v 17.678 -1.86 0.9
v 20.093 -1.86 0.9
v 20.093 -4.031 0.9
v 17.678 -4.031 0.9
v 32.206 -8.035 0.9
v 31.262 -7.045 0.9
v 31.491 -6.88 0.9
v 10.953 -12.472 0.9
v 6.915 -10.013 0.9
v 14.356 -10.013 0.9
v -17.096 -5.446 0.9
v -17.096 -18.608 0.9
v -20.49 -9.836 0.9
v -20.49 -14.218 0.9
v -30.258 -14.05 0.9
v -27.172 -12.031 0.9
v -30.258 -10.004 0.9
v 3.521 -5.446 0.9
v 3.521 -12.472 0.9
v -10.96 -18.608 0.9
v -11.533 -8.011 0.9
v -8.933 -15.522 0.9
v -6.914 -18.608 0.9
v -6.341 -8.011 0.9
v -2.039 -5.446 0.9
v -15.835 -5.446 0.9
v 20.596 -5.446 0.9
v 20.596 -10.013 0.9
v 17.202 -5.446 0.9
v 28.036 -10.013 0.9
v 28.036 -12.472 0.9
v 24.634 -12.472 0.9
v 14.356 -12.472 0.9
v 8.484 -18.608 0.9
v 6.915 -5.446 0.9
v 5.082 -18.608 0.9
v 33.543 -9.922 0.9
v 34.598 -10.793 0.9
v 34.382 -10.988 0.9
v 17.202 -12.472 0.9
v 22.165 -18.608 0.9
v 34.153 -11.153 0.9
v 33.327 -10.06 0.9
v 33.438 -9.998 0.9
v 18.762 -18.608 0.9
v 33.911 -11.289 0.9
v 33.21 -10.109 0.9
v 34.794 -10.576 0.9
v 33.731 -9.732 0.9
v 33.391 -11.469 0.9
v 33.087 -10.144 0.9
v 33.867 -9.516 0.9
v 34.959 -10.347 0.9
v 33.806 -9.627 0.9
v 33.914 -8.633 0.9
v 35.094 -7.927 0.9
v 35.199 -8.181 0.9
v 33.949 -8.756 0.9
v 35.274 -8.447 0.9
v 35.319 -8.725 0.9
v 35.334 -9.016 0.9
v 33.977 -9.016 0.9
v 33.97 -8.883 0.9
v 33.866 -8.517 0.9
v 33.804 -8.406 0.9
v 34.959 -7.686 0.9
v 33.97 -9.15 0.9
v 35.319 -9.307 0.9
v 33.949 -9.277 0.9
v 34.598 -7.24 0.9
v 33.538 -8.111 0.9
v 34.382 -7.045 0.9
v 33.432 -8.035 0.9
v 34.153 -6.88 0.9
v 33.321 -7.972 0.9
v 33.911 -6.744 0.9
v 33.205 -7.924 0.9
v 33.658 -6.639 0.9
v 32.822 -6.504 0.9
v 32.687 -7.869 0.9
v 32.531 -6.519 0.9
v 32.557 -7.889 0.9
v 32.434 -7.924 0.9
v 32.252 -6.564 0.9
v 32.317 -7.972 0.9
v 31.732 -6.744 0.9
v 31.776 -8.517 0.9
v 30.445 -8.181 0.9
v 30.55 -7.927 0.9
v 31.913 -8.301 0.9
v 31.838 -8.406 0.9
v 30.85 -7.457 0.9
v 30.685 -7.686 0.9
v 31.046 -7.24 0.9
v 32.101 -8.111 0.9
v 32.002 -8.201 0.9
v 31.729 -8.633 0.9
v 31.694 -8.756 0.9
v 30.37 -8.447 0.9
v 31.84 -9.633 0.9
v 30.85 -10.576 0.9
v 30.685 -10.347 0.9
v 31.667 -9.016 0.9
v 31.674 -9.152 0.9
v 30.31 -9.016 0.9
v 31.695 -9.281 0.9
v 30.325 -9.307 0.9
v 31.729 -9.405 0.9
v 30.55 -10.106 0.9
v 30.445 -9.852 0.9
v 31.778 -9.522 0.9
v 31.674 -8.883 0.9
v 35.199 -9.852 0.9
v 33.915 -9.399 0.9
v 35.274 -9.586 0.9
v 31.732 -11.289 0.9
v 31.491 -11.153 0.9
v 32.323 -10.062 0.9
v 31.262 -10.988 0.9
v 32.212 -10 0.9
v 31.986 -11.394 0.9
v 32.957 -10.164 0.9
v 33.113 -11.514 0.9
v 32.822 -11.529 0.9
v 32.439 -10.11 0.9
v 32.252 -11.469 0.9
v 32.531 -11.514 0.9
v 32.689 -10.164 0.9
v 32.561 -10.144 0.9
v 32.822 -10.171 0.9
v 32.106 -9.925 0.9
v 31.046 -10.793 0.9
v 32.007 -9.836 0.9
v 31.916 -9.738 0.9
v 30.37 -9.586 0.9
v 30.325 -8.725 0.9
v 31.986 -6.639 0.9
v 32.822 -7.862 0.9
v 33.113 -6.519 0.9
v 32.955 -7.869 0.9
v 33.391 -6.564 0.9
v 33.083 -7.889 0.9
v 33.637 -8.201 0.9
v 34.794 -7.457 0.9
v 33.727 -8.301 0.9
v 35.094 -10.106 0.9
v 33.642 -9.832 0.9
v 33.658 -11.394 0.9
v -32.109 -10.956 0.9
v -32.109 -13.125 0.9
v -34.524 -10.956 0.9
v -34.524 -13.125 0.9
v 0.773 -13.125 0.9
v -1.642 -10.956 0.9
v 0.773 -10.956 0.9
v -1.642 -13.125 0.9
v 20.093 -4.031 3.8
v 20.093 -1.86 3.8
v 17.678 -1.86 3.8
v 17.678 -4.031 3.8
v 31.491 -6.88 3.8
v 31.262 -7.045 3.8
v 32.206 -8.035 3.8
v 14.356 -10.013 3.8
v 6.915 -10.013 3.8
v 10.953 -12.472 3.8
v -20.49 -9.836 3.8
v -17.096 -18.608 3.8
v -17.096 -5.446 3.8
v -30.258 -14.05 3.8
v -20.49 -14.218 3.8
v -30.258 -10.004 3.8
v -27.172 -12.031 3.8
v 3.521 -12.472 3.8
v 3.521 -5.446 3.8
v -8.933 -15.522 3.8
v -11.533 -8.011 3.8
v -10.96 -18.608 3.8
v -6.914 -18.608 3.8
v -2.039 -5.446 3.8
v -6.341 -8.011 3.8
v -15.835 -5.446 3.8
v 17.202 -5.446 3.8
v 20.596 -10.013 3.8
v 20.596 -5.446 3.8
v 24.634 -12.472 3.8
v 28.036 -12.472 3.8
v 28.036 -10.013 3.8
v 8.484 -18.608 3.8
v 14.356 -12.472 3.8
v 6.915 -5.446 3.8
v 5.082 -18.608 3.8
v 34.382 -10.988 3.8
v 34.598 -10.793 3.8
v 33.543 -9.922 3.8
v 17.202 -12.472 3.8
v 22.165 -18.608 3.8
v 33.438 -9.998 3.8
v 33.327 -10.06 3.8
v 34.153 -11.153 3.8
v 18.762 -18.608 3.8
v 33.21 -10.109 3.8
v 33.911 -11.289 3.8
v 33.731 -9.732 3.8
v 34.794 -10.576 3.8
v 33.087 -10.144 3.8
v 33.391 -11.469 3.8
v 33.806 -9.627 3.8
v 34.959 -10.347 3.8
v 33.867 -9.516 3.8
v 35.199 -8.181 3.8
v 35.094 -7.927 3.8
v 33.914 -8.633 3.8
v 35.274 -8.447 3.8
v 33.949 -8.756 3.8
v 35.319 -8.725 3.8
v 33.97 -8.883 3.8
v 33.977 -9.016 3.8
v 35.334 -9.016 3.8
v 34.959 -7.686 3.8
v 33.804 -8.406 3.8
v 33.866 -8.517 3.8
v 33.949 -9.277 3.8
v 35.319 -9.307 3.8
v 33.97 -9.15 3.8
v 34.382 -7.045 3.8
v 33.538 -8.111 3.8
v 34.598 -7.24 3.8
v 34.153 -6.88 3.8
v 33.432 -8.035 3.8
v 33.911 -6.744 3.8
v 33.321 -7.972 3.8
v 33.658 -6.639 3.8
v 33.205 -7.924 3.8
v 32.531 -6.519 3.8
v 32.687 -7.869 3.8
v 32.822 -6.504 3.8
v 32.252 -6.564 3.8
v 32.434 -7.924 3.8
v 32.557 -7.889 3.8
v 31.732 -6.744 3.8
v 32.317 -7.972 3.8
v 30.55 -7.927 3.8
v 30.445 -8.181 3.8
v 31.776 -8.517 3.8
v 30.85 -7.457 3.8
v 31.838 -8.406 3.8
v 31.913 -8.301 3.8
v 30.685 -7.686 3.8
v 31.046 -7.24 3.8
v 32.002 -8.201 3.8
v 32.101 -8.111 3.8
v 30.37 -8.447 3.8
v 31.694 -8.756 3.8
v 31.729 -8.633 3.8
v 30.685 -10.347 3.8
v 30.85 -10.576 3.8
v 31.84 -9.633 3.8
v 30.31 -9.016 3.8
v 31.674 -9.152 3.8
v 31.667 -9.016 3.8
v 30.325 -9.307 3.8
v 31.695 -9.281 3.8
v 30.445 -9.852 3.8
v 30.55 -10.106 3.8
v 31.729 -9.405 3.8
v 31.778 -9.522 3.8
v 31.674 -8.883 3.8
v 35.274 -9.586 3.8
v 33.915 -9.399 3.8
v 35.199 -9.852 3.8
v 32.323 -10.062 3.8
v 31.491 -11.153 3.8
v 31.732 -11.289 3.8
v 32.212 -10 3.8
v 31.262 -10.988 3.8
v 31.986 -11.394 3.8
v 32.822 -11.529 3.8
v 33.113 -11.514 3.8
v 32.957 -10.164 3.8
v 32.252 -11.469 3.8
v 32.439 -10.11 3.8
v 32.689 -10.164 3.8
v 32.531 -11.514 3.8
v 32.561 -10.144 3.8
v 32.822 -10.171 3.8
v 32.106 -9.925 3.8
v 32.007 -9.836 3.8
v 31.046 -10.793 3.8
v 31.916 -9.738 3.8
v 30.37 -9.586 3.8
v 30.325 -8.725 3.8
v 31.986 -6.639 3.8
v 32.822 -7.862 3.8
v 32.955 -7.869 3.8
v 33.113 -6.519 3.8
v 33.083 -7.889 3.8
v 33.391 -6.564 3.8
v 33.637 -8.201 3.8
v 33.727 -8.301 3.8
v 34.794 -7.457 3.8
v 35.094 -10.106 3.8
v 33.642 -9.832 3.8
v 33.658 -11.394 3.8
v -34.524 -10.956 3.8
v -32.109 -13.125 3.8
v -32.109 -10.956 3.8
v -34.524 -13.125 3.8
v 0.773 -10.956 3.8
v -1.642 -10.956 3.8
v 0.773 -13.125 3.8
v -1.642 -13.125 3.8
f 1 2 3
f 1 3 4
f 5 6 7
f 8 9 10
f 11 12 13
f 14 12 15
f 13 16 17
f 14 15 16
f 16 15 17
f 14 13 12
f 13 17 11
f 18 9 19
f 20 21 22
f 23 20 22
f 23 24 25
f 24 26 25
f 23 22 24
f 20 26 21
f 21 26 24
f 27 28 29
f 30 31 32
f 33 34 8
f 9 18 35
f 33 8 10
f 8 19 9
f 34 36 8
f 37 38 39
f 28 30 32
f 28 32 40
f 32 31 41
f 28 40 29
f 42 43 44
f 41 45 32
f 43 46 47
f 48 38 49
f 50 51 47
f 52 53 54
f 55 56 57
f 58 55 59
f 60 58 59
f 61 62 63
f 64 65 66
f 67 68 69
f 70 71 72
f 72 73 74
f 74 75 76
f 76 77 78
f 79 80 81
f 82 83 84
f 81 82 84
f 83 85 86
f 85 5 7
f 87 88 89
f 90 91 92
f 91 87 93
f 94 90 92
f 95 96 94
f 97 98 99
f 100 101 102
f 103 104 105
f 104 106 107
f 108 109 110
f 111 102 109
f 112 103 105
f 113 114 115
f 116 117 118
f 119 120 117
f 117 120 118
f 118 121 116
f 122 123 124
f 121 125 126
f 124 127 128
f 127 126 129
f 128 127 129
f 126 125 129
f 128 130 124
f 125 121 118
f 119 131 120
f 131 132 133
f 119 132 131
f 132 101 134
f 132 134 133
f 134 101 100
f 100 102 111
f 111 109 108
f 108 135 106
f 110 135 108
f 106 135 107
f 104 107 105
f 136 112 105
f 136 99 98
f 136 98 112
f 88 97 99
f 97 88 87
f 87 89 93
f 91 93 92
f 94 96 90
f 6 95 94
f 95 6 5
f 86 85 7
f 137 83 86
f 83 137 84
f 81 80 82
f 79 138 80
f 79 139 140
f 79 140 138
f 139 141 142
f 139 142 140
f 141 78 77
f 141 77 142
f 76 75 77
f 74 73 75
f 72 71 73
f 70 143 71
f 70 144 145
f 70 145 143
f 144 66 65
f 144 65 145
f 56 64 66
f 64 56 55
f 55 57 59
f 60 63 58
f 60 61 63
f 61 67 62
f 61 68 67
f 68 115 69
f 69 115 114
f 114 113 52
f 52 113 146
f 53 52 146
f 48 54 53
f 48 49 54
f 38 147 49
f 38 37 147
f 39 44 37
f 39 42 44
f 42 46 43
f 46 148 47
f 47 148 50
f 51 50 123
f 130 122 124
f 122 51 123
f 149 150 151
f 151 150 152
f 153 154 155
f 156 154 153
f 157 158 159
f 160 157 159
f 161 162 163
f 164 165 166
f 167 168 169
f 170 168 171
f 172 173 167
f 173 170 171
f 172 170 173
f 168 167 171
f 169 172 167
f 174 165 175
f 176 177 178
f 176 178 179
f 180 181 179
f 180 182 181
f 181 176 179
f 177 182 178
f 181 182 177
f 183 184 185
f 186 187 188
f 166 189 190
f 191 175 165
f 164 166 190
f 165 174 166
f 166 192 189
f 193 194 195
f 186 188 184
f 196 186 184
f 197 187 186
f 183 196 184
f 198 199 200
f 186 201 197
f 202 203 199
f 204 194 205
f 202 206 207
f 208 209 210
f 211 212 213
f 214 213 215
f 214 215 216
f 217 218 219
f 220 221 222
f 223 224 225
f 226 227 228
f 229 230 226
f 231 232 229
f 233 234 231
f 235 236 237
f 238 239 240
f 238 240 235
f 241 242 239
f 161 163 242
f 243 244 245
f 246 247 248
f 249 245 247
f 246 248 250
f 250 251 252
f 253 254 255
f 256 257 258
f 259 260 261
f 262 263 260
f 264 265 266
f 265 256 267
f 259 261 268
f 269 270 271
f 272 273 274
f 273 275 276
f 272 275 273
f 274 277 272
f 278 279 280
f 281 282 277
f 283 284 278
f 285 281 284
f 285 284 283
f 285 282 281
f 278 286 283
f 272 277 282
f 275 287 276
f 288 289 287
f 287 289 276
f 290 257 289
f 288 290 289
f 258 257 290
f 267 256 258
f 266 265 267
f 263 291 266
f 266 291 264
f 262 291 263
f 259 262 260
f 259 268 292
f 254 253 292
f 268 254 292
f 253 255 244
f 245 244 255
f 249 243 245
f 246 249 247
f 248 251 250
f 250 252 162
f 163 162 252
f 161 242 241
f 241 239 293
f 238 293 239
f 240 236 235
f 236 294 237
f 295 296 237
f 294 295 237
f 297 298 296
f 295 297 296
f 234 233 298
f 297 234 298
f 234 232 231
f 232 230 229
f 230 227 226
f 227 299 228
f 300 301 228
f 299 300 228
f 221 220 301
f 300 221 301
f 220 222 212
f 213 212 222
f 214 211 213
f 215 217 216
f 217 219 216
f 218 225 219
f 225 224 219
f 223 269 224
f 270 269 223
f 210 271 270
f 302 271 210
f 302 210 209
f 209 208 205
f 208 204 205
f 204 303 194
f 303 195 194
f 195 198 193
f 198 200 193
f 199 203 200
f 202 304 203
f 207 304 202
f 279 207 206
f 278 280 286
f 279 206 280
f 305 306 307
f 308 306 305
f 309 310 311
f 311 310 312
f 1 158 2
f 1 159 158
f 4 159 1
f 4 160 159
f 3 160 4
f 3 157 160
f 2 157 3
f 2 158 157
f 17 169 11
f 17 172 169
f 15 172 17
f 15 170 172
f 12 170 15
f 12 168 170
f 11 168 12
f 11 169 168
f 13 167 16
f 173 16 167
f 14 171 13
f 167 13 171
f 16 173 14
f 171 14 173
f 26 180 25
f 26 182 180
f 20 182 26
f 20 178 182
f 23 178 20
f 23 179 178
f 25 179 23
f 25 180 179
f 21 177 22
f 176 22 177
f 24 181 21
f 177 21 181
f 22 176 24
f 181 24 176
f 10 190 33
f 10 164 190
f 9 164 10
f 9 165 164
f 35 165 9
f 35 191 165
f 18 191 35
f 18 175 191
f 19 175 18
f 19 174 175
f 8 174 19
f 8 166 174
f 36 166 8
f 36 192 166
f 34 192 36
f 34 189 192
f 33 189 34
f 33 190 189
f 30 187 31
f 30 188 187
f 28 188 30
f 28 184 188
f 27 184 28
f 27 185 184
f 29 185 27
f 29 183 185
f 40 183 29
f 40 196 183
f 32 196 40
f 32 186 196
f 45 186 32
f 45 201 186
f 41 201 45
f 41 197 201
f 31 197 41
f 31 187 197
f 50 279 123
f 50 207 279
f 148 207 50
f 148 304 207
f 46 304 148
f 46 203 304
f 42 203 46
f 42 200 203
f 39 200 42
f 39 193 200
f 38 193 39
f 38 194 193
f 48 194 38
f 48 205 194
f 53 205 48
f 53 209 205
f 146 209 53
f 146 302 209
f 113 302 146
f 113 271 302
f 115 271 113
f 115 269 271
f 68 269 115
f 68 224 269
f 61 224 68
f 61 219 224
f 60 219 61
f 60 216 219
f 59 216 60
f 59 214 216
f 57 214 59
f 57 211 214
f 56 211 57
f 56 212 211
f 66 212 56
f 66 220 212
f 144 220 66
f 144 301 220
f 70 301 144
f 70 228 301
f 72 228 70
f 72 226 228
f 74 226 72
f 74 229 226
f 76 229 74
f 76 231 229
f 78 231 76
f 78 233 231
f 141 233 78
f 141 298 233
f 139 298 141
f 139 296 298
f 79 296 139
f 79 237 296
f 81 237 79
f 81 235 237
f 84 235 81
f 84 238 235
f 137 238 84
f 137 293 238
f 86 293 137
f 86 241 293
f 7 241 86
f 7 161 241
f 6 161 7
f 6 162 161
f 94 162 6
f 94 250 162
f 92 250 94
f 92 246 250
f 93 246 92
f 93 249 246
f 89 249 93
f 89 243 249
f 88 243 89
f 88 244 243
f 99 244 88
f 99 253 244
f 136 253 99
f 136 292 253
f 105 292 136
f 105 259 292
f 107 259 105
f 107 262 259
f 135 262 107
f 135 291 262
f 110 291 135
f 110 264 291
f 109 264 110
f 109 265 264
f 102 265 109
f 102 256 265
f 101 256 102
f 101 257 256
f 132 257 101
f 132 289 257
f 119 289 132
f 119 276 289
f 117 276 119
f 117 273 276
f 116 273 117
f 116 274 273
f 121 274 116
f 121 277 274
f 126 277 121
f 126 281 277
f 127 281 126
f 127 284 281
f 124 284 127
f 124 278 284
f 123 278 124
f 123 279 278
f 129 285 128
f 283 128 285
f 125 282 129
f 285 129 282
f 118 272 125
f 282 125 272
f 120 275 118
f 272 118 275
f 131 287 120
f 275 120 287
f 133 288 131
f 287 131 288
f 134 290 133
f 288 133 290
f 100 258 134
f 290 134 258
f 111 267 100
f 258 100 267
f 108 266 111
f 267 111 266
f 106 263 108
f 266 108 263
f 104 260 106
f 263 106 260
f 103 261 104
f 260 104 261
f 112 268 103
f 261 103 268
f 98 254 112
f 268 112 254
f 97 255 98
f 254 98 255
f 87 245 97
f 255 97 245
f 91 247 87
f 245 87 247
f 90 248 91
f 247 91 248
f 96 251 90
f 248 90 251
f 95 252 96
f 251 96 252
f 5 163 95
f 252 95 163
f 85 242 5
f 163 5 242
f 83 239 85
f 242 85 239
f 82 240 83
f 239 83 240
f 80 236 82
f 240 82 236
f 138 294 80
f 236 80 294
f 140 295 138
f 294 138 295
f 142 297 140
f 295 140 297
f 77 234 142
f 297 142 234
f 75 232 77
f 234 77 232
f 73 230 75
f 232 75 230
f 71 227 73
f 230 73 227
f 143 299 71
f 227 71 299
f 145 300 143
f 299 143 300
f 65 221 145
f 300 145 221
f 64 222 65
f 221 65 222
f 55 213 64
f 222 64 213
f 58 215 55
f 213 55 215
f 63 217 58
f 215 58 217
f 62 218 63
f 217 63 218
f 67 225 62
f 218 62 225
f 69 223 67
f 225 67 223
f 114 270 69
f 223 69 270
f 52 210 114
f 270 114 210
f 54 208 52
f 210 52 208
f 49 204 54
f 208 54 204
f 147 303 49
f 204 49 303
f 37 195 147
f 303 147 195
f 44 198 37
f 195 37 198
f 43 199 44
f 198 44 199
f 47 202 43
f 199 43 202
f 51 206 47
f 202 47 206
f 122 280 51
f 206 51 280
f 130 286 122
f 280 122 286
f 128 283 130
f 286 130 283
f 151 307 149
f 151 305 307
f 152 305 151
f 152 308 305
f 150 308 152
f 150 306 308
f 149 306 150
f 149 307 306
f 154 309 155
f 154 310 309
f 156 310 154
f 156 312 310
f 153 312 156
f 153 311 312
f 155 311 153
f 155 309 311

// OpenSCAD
$fn = 48;
  // syllabics (overlaid on icon, tallest) — row 2
  translate([0, -10.430, 0.900]) linear_extrude(height=2.900) text("ᐗᐍᔭᔮᐤ", size=13.000, halign="center", valign="center", font="Euphemia UCAS:style=Bold");
